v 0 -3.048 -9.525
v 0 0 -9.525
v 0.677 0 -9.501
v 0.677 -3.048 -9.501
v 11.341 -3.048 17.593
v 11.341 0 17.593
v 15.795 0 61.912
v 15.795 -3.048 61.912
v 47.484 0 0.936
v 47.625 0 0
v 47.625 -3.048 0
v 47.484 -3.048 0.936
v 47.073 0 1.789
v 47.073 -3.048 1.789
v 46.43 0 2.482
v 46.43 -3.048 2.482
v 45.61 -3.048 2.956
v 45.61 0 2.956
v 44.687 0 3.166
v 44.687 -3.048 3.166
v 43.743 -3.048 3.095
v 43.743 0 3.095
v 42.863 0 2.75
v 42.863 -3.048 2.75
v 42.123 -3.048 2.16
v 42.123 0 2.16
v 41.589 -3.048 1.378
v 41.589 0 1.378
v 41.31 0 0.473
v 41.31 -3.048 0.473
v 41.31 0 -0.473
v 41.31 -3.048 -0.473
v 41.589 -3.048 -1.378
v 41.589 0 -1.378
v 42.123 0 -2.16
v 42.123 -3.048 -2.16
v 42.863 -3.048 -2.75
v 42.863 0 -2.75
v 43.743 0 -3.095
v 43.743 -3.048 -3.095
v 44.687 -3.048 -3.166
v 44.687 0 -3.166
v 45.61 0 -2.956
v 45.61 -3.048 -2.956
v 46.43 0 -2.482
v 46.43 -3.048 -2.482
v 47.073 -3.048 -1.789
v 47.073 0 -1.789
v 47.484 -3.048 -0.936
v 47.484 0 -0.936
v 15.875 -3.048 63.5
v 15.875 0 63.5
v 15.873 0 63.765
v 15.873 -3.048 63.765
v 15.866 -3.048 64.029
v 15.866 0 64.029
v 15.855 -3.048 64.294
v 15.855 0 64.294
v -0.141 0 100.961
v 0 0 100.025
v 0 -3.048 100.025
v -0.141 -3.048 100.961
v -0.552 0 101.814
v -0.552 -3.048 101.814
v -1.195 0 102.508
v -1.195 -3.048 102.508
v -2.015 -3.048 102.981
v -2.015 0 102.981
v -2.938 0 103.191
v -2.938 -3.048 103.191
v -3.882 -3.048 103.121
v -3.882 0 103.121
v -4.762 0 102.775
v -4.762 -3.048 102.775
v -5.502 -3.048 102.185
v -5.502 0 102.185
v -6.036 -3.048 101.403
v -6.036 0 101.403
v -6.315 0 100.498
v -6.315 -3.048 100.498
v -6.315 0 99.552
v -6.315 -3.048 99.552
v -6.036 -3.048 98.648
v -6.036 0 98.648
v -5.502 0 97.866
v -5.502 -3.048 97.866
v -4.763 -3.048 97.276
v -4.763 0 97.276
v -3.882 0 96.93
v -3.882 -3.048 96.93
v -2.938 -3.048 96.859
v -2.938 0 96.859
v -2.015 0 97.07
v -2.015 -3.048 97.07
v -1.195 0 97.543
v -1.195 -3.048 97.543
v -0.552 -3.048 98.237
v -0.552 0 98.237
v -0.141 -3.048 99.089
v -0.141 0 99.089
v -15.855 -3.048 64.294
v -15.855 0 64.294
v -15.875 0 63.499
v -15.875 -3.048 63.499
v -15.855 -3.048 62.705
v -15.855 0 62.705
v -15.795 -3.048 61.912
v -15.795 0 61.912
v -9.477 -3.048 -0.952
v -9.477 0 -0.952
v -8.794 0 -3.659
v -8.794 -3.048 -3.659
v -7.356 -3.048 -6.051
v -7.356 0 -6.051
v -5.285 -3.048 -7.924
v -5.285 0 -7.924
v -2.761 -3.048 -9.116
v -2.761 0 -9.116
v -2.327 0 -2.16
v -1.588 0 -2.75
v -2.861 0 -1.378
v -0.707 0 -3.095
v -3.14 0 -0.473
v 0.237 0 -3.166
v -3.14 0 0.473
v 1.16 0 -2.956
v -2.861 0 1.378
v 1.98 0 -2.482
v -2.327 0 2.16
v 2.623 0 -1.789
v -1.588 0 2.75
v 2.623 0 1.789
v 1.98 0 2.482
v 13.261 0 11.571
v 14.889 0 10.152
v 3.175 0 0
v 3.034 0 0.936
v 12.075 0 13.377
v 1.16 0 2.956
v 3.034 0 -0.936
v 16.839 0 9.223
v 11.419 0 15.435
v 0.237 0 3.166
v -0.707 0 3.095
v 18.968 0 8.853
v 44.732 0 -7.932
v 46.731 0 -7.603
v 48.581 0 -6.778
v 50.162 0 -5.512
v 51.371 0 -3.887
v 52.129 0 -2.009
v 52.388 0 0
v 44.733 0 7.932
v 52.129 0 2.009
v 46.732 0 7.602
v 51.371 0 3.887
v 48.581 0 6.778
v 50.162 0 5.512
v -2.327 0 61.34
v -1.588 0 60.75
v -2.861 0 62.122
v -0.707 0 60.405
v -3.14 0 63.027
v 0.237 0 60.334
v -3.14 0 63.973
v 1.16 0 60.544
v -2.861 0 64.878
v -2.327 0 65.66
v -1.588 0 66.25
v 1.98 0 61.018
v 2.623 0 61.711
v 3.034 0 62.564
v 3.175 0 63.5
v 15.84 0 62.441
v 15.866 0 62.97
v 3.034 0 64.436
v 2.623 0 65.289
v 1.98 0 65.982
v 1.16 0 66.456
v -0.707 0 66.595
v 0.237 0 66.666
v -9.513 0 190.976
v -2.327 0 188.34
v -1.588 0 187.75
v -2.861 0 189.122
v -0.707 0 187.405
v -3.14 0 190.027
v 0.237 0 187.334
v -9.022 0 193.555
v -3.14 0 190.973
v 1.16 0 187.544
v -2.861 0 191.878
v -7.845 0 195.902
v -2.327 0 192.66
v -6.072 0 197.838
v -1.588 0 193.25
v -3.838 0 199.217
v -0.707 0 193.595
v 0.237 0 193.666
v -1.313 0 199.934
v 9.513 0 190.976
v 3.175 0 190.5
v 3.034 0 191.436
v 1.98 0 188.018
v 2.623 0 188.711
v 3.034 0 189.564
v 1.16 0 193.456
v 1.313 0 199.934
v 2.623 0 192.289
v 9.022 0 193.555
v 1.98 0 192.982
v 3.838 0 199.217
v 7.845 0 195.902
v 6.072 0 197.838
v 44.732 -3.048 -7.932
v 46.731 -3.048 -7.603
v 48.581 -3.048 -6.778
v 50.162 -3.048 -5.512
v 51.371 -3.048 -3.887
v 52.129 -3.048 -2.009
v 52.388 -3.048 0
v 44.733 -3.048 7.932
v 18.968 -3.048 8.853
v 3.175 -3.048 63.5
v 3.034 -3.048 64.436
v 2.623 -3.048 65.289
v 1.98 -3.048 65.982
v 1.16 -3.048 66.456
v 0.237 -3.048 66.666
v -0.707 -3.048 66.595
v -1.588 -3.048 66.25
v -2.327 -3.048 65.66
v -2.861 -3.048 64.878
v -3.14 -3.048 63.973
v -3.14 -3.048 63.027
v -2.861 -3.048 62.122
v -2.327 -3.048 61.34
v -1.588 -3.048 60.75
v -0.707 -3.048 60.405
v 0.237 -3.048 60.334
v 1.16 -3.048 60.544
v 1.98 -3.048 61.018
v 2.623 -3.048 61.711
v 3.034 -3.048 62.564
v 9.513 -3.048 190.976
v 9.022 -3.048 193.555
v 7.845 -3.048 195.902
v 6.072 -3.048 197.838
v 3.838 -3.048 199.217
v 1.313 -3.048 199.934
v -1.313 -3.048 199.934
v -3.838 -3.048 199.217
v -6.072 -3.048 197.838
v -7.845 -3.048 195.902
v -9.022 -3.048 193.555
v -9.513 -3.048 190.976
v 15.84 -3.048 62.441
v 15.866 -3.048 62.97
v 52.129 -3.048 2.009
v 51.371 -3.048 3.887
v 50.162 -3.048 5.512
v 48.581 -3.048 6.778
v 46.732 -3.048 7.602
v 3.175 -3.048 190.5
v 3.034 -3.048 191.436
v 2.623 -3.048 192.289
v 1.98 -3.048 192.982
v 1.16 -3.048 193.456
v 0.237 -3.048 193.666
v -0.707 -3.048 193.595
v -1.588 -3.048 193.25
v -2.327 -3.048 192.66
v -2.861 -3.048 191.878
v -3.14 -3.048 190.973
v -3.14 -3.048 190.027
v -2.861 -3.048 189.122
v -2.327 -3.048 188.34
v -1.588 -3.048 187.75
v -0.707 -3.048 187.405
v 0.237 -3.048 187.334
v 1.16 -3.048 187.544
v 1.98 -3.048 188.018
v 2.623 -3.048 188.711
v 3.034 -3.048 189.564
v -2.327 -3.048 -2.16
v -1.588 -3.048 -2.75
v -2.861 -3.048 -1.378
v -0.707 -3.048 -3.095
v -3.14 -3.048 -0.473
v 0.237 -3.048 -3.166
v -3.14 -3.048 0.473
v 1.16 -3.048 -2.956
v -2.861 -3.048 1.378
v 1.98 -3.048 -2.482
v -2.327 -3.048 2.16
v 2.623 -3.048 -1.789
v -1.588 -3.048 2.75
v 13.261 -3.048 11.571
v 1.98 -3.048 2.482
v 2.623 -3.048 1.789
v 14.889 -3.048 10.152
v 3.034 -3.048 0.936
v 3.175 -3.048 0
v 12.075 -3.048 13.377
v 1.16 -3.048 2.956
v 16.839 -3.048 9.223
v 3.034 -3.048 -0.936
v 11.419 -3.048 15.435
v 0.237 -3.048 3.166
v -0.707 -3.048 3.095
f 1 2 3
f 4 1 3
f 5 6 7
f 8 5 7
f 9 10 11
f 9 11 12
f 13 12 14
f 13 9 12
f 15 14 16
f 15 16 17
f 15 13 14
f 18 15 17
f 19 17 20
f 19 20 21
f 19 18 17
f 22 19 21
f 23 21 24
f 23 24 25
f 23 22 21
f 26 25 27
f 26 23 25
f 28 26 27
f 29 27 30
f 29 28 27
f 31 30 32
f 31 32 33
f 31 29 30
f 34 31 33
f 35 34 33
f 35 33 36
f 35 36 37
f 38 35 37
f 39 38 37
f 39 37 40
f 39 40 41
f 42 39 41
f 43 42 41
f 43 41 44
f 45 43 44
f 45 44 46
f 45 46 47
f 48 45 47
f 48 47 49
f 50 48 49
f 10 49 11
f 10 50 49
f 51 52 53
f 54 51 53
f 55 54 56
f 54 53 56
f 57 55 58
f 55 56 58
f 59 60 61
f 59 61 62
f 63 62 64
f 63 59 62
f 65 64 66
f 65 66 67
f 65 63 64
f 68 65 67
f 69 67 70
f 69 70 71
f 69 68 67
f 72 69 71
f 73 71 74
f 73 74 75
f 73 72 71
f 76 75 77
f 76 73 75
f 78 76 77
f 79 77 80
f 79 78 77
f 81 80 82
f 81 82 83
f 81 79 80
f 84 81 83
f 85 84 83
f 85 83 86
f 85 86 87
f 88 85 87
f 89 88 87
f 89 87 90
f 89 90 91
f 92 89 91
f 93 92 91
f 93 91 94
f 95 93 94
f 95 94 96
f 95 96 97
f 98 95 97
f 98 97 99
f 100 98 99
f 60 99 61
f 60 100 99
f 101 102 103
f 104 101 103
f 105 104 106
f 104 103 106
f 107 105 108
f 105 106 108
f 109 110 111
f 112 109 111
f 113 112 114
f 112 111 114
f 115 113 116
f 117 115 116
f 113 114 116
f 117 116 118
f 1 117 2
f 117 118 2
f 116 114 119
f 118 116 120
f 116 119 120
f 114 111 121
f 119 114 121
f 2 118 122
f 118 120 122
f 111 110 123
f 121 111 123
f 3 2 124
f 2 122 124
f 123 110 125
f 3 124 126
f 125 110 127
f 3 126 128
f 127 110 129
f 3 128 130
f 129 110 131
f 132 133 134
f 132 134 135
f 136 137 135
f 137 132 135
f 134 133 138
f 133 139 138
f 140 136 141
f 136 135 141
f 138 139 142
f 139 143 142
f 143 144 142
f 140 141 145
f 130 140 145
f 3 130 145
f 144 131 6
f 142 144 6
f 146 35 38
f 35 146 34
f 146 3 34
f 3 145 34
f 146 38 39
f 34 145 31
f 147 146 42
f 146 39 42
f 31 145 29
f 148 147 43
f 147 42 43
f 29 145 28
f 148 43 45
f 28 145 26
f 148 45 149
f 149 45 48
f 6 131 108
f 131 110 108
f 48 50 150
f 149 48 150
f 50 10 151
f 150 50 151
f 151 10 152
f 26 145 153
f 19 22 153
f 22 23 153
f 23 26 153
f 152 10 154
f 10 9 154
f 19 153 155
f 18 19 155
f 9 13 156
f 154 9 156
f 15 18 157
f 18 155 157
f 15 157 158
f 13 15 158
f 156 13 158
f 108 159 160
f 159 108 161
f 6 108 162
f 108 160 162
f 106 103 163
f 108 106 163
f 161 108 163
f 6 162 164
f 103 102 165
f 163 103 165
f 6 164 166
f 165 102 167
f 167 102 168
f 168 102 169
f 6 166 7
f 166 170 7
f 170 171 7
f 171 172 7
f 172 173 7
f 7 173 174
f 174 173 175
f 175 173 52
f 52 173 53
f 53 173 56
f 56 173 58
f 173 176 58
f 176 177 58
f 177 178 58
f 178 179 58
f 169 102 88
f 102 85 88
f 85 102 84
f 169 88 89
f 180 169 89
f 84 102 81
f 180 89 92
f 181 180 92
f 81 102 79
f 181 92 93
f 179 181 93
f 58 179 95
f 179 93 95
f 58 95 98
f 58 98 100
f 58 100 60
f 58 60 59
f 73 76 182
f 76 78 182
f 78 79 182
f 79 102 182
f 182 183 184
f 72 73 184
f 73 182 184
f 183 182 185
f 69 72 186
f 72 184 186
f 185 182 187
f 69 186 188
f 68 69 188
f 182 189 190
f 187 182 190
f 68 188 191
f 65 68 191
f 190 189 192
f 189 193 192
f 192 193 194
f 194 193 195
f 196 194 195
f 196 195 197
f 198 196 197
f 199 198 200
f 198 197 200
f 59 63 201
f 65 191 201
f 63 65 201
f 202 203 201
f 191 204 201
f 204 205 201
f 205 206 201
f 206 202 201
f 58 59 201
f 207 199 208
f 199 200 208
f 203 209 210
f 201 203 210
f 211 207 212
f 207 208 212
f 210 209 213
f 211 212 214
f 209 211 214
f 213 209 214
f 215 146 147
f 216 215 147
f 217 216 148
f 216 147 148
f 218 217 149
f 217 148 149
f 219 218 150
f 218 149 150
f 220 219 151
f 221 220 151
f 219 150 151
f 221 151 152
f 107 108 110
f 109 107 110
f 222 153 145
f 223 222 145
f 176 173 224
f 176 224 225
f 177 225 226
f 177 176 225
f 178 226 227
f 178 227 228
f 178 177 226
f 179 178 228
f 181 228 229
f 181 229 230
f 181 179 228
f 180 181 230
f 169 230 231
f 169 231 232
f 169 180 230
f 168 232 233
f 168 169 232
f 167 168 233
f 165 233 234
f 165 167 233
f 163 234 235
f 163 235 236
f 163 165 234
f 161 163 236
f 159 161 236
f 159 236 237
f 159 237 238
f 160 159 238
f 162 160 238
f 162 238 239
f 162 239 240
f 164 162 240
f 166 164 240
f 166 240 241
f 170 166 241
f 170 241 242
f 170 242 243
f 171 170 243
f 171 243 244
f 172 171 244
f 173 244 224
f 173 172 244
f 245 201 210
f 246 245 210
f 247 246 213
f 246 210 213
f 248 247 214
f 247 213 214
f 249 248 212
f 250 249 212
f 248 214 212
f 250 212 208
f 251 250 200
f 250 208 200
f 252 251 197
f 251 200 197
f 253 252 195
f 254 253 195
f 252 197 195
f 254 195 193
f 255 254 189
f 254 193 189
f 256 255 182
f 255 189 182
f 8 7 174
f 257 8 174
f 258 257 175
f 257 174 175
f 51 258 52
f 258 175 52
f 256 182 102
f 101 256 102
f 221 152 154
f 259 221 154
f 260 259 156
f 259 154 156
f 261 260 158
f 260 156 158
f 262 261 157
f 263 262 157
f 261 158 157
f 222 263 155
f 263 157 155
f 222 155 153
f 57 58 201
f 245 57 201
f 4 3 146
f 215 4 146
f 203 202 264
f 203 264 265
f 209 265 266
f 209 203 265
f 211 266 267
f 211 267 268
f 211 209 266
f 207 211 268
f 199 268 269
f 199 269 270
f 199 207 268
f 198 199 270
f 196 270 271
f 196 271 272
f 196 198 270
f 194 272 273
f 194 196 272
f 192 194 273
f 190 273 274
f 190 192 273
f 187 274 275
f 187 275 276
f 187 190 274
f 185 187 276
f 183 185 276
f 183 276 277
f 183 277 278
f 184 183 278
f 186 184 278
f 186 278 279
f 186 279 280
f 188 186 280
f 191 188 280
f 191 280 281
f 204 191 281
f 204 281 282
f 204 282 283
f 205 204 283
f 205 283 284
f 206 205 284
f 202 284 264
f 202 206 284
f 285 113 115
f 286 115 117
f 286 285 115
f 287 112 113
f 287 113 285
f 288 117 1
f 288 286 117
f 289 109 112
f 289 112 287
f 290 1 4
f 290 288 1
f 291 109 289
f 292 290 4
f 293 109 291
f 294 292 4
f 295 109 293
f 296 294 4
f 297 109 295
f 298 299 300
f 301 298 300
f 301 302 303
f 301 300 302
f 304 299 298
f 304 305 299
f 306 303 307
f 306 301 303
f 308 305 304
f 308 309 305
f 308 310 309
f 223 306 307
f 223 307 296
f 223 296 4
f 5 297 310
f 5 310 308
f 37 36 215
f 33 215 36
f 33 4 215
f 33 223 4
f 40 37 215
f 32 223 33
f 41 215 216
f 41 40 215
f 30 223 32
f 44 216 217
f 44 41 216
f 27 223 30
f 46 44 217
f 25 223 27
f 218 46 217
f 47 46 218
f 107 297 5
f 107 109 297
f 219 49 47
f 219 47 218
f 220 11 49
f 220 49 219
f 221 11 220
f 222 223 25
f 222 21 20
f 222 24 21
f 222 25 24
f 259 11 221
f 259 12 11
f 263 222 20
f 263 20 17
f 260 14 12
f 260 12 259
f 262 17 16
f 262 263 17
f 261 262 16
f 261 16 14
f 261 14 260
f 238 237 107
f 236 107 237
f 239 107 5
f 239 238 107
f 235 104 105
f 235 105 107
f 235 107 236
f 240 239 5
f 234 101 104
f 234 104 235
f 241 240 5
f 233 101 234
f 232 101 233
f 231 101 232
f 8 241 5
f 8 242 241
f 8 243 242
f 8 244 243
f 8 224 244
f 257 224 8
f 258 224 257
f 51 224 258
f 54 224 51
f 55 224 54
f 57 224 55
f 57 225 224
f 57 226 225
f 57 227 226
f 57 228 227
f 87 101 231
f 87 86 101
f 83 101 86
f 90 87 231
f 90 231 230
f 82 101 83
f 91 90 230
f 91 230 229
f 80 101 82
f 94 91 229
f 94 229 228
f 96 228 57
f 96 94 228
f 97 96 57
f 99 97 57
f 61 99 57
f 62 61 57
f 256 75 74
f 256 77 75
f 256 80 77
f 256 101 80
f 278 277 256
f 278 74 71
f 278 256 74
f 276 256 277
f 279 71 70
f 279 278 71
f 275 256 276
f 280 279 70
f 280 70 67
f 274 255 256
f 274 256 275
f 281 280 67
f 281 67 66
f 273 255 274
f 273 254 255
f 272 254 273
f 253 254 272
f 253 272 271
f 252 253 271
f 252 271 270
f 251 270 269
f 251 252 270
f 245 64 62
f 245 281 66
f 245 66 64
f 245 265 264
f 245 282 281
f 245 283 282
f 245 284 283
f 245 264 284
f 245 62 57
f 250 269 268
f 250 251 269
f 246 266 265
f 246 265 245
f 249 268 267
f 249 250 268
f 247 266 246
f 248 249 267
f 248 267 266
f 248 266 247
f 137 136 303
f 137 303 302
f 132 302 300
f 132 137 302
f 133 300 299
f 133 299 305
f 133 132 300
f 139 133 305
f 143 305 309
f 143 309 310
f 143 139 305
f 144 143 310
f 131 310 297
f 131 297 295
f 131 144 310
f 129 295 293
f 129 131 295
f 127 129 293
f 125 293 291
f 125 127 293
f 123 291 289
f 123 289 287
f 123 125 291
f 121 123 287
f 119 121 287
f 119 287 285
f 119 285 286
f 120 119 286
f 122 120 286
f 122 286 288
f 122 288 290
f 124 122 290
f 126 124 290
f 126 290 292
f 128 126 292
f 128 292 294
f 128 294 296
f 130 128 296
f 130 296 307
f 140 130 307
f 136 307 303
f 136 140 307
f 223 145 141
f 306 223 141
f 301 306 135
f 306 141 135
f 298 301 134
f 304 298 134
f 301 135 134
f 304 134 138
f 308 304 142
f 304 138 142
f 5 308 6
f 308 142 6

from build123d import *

# Parameters (mm, degrees)
F0_R     = 3.175
F1_DEPTH = 3.048


with BuildPart() as f1:
    # F0 (on Front) → F1 (new body)
    with BuildSketch(Plane.XZ):
        with BuildLine():
            Line((-9.513086, 190.97625), (-15.855144, 64.29375))
            ThreePointArc((-15.855144, 64.29375), (0, 79.375), (15.855144, 64.29375))
            Line((15.855144, 64.29375), (9.513086, 190.97625))
            ThreePointArc((9.513086, 190.97625), (9.522021, 190.738199), (9.525, 190.5))
            ThreePointArc((9.525, 190.5), (-0.238199, 180.977979), (-9.513086, 190.97625))
        make_face()
        with Locations((-3.175, 100.0252)):
            Circle(F0_R, mode=Mode.SUBTRACT)
        with BuildLine():
            ThreePointArc((-9.477255, -0.9525), (-0.476848, 9.513056), (9.525, 0))
            ThreePointArc((9.525, 0), (6.970557, -6.491299), (0.677344, -9.500886))
            Line((0.677344, -9.500886), (44.732405, -7.932475))
            ThreePointArc((44.732405, -7.932475), (36.5125, 0.000539), (44.733482, 7.932436))
            Line((44.733482, 7.932436), (18.9676, 8.853234))
            ThreePointArc((18.9676, 8.853234), (13.2612, 11.571359), (11.341187, 17.593382))
            Line((11.341187, 17.593382), (15.795426, 61.9125))
            ThreePointArc((15.795426, 61.9125), (0, 47.625), (-15.795426, 61.9125))
            Line((-15.795426, 61.9125), (-9.477255, -0.9525))
        make_face()
        with BuildLine():
            ThreePointArc((-15.855144, 64.29375), (-15.87001, 63.102003), (-15.795426, 61.9125))
            ThreePointArc((-15.795426, 61.9125), (0, 47.625), (15.795426, 61.9125))
            ThreePointArc((15.795426, 61.9125), (15.855094, 62.705253), (15.875, 63.5))
            ThreePointArc((15.875, 63.5), (15.870035, 63.896999), (15.855144, 64.29375))
            ThreePointArc((15.855144, 64.29375), (0, 79.375), (-15.855144, 64.29375))
        make_face()
        with Locations((0, 63.5)):
            Circle(F0_R, mode=Mode.SUBTRACT)
        with BuildLine():
            ThreePointArc((0.677344, -9.500886), (6.970557, -6.491299), (9.525, 0))
            ThreePointArc((9.525, 0), (-0.476848, 9.513056), (-9.477255, -0.9525))
            ThreePointArc((-9.477255, -0.9525), (-6.389564, -7.063929), (0, -9.525))
            Line((0, -9.525), (0.677344, -9.500886))
        make_face()
        Circle(F0_R, mode=Mode.SUBTRACT)
        with BuildLine():
            ThreePointArc((44.733482, 7.932436), (36.5125, 0.000539), (44.732405, -7.932475))
            ThreePointArc((44.732405, -7.932475), (50.161633, -5.51191), (52.3875, 0))
            ThreePointArc((52.3875, 0), (50.162007, 5.511523), (44.733482, 7.932436))
        make_face()
        with Locations((44.45, 0)):
            Circle(F0_R, mode=Mode.SUBTRACT)
        with BuildLine():
            ThreePointArc((9.513086, 190.97625), (0, 200.025), (-9.513086, 190.97625))
            ThreePointArc((-9.513086, 190.97625), (-0.238199, 180.977979), (9.525, 190.5))
            ThreePointArc((9.525, 190.5), (9.522021, 190.738199), (9.513086, 190.97625))
        make_face()
        with Locations((0, 190.5)):
            Circle(F0_R, mode=Mode.SUBTRACT)
    extrude(amount=F1_DEPTH)


solid = f1.part
